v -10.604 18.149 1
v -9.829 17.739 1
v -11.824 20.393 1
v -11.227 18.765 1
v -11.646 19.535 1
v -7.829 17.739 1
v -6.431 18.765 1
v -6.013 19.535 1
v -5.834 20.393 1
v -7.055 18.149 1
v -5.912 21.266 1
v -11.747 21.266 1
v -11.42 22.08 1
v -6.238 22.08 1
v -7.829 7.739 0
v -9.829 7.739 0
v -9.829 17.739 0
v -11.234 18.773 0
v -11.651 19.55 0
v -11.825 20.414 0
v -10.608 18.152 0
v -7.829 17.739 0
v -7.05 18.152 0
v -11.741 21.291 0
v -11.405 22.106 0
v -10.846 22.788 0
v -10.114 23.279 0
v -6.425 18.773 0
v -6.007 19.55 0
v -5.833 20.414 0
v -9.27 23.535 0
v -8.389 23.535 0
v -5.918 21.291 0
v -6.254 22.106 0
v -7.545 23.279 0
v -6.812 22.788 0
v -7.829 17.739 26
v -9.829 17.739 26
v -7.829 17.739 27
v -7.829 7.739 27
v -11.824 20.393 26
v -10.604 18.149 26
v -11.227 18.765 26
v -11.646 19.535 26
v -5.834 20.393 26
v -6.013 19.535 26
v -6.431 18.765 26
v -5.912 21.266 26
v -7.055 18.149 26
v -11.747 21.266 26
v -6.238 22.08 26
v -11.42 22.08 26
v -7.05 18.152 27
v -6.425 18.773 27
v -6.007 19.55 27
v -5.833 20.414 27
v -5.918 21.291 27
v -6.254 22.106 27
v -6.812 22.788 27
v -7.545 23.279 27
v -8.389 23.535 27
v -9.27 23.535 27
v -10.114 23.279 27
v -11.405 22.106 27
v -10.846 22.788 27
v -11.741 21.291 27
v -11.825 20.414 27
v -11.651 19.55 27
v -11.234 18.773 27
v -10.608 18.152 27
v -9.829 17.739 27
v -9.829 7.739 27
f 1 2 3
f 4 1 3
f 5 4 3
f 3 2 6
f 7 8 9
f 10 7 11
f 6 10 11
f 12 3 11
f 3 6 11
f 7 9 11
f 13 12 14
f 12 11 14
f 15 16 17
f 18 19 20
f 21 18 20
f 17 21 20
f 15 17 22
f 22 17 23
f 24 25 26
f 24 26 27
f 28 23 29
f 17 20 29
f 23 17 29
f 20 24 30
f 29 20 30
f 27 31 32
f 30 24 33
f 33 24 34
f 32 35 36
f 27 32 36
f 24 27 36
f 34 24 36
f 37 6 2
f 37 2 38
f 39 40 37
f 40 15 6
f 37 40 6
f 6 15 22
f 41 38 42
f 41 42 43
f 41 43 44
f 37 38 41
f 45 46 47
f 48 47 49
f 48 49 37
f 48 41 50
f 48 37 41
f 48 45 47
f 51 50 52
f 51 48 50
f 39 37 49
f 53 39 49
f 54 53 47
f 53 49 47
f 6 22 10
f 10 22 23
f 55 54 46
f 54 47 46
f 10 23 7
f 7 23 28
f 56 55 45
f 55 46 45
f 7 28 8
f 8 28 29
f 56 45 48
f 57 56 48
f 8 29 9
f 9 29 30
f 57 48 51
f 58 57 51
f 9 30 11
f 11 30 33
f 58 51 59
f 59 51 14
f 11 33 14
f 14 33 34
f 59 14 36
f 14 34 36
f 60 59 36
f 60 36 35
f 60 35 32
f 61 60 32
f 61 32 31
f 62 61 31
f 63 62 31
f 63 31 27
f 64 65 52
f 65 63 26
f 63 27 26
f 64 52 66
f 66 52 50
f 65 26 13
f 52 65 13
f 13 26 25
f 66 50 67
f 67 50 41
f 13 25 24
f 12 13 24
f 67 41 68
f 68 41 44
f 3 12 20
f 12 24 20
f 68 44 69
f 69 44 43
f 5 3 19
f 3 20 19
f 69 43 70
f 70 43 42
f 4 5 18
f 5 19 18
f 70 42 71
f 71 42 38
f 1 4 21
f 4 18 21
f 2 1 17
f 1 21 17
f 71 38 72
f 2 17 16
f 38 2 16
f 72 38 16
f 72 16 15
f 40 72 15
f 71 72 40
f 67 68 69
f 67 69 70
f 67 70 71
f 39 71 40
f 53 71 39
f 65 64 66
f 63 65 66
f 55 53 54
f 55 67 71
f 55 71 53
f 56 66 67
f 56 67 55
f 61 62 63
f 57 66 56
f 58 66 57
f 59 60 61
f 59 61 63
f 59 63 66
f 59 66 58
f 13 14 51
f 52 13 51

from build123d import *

# Parameters (mm, degrees)
F1_DEPTH = 27
F2_W     = 4.3404353922
F2_H     = 25
F3_DEPTH = 25


# Not quite as in the source:
# - a feature names something its author has since deleted; it is built from what else it names


with BuildPart() as f1:
    # F0 (on Top) → F1 (new body)
    with BuildSketch(Plane.XY):
        with BuildLine():
            Line((-9.8292995244, 17.7390783057), (-9.8292995244, 7.7390783057))
            Line((-9.8292995244, 7.7390783057), (-7.8292995244, 7.7390783057))
            Line((-7.8292995244, 7.7390783057), (-7.8292995244, 17.7390783057))
            ThreePointArc((-7.8292995244, 17.7390783057), (-8.8292995244, 23.5675054304), (-9.8292995244, 17.7390783057))
        make_face()
    extrude(amount=F1_DEPTH)

    # F2 (on Right) → F3 (cut)
    with BuildSketch(Plane.YZ):
        with Locations((19.9092960018, 13.5)):
            Rectangle(F2_W, F2_H)
    extrude(amount=-F3_DEPTH, mode=Mode.SUBTRACT)


solid = f1.part
